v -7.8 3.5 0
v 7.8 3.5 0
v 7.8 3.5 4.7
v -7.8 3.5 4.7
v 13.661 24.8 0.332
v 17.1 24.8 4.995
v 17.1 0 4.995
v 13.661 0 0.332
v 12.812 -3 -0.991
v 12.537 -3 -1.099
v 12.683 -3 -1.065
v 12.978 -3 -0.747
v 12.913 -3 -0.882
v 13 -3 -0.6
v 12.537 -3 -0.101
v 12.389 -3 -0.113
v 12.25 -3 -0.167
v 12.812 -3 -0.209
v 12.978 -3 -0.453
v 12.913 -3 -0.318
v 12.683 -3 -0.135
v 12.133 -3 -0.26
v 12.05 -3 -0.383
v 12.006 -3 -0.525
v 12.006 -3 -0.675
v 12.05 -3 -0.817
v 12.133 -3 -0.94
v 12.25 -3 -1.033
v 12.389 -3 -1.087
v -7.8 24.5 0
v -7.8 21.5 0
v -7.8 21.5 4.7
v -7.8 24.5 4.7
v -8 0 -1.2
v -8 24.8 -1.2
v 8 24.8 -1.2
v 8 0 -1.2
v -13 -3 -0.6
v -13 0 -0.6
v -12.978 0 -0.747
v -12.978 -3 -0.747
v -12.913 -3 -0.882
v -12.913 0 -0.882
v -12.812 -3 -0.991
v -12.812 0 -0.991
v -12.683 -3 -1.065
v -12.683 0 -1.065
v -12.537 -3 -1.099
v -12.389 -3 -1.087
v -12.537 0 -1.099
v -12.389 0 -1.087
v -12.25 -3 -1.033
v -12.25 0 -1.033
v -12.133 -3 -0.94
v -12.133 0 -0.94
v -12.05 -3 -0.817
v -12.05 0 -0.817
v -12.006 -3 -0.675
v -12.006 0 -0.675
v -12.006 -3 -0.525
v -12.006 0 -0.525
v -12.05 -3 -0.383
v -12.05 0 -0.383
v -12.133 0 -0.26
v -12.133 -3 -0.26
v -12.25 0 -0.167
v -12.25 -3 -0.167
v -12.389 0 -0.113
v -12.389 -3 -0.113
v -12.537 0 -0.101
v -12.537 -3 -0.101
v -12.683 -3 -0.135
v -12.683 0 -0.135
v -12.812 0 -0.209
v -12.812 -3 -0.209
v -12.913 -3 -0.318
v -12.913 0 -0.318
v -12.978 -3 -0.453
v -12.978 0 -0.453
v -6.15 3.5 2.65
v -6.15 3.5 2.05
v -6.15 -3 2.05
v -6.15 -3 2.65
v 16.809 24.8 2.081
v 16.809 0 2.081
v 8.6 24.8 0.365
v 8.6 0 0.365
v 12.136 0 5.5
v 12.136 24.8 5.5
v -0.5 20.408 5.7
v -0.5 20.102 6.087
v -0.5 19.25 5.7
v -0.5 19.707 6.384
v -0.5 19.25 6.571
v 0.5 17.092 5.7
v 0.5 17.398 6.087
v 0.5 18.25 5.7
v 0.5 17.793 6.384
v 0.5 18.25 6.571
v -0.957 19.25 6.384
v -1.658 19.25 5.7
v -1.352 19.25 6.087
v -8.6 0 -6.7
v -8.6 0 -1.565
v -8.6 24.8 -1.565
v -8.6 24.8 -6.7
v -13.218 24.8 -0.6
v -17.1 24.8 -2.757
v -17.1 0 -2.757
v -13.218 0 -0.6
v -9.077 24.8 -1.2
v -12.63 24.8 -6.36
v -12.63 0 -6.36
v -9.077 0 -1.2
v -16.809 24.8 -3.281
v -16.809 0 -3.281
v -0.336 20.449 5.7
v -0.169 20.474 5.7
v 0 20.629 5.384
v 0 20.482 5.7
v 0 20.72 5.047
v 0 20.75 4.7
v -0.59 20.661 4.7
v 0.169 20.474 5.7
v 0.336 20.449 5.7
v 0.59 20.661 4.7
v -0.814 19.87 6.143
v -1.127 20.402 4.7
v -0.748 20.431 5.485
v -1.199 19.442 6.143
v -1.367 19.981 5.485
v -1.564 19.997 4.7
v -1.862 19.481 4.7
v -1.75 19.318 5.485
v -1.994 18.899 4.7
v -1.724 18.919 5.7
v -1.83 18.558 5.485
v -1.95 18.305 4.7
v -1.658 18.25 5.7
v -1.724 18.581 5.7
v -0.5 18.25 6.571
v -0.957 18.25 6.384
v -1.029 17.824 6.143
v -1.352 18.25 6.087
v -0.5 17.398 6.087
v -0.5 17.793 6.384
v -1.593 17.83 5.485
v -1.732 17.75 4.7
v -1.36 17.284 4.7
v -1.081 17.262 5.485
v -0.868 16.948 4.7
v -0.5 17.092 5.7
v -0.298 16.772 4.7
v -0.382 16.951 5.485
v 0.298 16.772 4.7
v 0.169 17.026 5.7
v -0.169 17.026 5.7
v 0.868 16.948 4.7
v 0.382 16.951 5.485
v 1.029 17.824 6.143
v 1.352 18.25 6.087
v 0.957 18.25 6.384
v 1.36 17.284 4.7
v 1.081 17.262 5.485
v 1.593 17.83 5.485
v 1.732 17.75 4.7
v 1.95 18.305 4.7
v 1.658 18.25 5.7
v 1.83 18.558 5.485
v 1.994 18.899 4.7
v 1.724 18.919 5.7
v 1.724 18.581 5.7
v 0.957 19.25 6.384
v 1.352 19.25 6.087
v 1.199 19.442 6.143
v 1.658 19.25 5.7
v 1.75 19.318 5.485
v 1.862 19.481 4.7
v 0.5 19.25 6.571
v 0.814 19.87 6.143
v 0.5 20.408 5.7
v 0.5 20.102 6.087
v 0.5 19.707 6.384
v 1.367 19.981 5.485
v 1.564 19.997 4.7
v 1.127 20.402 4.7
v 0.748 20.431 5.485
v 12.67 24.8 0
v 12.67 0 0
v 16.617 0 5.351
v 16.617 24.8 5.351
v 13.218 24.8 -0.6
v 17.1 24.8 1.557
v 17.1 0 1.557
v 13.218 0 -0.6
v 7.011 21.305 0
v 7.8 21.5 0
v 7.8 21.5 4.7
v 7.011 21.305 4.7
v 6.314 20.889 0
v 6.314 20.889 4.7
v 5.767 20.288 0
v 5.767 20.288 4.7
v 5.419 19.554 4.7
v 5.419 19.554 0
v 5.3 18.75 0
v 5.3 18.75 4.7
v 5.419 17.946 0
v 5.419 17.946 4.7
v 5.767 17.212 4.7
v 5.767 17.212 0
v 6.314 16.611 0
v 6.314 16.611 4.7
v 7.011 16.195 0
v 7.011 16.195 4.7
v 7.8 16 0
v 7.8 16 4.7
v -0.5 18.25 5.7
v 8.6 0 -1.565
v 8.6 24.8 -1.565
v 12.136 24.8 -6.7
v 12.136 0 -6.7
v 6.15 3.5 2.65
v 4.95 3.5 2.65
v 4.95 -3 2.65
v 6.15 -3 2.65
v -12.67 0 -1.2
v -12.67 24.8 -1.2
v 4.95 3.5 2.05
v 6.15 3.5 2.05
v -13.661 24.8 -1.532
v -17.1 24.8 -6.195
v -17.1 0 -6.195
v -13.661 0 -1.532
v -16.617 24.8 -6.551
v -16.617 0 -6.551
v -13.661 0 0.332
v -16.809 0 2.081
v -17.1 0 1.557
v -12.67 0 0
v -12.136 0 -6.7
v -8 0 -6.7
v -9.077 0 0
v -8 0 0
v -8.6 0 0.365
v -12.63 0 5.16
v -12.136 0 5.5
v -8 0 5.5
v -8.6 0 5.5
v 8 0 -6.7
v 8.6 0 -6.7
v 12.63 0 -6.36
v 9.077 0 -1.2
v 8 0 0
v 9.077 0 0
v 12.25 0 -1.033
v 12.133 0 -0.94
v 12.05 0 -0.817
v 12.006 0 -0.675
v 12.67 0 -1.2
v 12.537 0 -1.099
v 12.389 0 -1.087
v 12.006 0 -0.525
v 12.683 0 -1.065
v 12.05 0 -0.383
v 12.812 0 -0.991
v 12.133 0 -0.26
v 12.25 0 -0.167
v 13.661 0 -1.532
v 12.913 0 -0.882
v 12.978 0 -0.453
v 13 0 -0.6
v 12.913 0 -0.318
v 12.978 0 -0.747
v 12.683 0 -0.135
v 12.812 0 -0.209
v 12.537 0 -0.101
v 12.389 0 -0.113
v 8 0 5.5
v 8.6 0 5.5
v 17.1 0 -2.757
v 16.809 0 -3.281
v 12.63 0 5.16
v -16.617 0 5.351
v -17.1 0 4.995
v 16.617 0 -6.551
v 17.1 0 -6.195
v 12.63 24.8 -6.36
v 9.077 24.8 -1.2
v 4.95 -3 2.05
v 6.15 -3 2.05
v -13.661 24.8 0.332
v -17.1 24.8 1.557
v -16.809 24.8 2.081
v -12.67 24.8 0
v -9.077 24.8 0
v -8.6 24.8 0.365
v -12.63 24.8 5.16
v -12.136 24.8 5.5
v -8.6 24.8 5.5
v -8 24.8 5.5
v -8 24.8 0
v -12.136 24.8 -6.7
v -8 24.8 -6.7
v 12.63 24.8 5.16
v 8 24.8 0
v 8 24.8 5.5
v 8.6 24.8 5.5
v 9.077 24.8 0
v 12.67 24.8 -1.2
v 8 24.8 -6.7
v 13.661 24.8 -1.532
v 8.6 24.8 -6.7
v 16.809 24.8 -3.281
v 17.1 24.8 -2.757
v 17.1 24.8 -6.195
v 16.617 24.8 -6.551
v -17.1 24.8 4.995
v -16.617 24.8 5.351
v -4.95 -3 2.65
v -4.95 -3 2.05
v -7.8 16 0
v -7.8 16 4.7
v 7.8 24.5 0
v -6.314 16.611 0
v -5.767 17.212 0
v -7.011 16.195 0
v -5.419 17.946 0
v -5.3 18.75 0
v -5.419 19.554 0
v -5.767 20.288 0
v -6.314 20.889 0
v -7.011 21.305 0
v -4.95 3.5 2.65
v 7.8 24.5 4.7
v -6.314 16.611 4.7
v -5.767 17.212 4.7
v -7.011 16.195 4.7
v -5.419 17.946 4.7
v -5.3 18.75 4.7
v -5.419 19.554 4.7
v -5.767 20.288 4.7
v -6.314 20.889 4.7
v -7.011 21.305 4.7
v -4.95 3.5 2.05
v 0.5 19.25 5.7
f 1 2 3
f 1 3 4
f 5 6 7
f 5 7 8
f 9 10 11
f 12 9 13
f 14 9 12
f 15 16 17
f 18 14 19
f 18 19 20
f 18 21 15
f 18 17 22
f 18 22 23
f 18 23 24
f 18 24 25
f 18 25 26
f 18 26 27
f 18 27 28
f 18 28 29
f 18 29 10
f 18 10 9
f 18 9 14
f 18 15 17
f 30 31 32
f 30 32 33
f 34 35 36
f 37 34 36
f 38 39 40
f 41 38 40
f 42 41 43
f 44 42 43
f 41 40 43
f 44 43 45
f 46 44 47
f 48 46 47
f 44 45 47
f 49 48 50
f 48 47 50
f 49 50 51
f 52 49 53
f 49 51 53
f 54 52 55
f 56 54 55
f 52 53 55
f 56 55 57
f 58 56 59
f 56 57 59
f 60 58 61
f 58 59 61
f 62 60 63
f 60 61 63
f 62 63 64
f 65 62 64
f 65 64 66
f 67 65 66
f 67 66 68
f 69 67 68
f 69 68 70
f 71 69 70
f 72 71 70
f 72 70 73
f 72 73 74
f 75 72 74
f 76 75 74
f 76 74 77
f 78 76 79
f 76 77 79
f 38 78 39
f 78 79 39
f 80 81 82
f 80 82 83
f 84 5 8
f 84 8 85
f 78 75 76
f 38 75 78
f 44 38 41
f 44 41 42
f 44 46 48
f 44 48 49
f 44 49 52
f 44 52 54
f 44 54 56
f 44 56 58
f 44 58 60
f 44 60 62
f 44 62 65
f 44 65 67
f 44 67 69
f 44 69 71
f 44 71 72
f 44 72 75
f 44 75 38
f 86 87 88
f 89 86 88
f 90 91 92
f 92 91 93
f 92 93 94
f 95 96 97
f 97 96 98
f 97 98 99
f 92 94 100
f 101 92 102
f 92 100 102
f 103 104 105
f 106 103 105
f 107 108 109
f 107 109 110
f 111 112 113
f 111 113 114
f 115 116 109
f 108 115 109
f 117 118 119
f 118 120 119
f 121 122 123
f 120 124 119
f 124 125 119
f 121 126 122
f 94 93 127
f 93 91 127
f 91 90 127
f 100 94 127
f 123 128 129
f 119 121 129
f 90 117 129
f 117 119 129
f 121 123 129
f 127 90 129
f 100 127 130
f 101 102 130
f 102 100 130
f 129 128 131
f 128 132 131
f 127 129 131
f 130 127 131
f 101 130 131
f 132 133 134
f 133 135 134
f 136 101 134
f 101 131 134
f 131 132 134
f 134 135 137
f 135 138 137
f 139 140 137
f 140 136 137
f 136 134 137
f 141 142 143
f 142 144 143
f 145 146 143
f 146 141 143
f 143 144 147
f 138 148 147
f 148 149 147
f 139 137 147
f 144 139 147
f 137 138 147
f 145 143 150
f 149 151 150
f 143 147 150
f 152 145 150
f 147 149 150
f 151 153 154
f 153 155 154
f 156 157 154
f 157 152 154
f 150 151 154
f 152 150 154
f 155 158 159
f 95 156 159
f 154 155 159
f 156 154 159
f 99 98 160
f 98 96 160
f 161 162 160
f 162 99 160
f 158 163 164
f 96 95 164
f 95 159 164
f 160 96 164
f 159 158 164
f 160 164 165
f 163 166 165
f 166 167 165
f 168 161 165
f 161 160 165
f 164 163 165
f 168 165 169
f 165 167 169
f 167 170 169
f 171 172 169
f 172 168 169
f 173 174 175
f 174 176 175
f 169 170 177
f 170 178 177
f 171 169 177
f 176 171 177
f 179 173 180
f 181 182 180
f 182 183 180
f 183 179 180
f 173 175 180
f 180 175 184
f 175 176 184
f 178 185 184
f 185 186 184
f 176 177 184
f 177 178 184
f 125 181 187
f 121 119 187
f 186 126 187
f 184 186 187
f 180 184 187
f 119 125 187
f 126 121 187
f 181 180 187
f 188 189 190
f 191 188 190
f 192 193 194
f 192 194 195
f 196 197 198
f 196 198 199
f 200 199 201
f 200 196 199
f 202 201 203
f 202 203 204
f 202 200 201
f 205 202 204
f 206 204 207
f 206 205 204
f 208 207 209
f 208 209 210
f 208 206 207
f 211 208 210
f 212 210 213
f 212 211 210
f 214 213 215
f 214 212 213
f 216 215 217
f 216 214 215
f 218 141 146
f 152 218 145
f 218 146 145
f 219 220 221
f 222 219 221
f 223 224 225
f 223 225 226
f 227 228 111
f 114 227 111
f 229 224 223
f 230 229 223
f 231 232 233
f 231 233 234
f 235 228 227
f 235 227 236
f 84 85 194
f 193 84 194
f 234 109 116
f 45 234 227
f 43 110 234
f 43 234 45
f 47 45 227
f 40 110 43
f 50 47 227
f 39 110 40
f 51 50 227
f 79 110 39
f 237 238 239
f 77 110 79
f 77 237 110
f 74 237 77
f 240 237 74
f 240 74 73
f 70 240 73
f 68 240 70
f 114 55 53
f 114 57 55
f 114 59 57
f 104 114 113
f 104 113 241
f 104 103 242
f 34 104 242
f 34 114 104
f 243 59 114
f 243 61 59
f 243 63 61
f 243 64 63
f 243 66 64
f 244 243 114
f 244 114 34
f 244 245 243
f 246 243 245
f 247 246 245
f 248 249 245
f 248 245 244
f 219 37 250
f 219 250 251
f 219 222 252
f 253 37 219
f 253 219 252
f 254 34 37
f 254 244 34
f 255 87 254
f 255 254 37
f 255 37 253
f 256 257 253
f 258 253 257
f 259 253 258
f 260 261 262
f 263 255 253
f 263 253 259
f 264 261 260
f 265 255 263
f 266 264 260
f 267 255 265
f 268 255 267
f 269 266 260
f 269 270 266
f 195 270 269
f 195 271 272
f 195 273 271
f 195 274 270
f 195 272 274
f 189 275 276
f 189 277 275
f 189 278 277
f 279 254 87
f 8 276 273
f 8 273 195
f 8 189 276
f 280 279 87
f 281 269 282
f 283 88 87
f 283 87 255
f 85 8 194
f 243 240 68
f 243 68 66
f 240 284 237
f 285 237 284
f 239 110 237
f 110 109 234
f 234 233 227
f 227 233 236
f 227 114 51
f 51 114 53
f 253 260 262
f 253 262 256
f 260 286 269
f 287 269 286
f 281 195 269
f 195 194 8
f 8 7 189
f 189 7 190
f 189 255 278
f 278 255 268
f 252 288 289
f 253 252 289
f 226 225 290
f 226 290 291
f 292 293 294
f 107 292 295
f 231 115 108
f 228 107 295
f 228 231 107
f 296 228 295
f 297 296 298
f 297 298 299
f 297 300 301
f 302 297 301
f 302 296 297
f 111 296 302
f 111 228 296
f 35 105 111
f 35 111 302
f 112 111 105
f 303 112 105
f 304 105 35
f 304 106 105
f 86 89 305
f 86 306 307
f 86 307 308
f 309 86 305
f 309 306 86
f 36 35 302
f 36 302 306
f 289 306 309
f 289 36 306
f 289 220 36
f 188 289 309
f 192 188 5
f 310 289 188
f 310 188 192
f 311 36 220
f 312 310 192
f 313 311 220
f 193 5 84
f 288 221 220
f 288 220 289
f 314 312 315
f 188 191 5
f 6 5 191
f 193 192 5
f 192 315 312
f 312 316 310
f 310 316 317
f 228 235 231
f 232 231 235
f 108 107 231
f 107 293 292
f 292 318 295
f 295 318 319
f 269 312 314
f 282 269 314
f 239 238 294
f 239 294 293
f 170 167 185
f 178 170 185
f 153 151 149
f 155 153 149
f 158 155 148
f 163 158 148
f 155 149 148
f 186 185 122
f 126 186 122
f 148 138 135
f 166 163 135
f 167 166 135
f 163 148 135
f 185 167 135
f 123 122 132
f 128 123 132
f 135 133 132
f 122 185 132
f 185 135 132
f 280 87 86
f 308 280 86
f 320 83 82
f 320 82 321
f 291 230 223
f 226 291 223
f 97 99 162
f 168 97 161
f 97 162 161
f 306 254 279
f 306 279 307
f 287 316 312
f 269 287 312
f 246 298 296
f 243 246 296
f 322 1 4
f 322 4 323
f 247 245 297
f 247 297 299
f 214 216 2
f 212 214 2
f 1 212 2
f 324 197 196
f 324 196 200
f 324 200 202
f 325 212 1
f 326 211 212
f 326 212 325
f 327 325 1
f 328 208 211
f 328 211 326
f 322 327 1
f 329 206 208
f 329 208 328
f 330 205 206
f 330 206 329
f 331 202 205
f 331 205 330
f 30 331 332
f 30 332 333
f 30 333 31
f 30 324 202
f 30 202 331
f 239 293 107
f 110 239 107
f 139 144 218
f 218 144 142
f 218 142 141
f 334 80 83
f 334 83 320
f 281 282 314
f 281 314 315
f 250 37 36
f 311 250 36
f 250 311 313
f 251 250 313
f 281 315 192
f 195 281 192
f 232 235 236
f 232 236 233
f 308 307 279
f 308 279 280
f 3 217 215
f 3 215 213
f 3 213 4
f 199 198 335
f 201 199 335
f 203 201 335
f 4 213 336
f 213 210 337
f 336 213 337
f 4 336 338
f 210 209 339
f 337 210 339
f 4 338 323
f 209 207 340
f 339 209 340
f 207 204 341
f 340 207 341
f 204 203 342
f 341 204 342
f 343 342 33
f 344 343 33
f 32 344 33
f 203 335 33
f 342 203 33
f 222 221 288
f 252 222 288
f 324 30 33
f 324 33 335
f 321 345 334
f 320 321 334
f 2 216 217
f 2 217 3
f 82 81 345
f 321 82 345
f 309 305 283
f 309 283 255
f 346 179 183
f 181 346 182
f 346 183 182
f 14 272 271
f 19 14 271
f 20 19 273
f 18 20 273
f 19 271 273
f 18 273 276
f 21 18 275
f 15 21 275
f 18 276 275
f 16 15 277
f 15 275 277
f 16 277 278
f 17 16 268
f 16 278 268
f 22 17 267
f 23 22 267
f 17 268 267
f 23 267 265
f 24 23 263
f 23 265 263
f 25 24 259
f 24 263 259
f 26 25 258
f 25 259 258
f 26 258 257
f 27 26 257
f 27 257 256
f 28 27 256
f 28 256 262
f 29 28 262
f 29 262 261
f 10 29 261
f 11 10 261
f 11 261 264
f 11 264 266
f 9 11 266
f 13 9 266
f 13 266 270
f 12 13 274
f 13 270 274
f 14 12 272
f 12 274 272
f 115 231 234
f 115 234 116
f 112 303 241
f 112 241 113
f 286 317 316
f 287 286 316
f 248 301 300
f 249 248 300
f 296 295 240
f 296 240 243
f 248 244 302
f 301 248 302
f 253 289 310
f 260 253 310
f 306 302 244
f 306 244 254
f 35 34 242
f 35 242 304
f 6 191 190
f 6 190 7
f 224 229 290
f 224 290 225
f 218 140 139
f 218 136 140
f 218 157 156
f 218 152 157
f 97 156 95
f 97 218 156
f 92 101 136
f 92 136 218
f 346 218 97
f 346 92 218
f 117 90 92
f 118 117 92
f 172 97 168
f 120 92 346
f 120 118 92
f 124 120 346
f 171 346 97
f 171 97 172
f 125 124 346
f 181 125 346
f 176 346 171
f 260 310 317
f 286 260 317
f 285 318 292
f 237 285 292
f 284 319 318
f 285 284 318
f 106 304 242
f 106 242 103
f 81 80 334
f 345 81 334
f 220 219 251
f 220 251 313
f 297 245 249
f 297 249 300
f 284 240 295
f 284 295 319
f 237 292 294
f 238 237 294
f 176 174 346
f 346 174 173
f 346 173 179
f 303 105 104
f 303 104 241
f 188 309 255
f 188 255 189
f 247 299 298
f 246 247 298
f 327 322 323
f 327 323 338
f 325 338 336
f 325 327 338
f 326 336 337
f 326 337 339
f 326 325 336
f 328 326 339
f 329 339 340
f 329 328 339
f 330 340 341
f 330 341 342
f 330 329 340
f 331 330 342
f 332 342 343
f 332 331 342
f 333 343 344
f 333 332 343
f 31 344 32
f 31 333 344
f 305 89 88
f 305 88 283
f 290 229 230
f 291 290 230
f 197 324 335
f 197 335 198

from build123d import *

# Parameters (mm, degrees)
CROQUIS1_W                = 25.8
CROQUIS1_H                = 24.8
SALIENTE_EXTRUIR1_DEPTH   = 1.2
CROQUIS2_W                = 0.6
CROQUIS2_H                = 24.8
SALIENTE_EXTRUIR2_DEPTH   = 5.5
SALIENTE_EXTRUIR3_DEPTH   = 24.8
SIMETR_A2_COPY_1_SKETCH_W = 0.6
SIMETR_A2_COPY_1_SKETCH_H = 24.8
SIMETR_A2_COPY_1_DEPTH    = 5.5
SIMETR_A2_COPY_2_DEPTH    = 24.8
CROQUIS4_R                = 0.5
SALIENTE_EXTRUIR4_DEPTH   = 3
SALIENTE_EXTRUIR5_DEPTH   = 4.7
CROQUIS6_W                = 1.2
CROQUIS6_H                = 0.6
SALIENTE_EXTRUIR6_DEPTH   = 6.5
SALIENTE_EXTRUIR6_2_DEPTH = 6.5
CORTAR_EXTRUIR1_DEPTH     = 1


with BuildPart() as part:
    # Croquis1 → Saliente-Extruir1 (new body)
    with BuildSketch(Plane.XY):
        with Locations((0, 12.4)):
            Rectangle(CROQUIS1_W, CROQUIS1_H)
    extrude(amount=-SALIENTE_EXTRUIR1_DEPTH)

    # Croquis2 → Saliente-Extruir2 (add)
    with BuildSketch(Plane.XY):
        with Locations((8.3, 12.4)):
            Rectangle(CROQUIS2_W, CROQUIS2_H)
    saliente_extruir2 = extrude(amount=SALIENTE_EXTRUIR2_DEPTH)

    # Croquis3 → Saliente-Extruir3 (add)
    with BuildSketch(Plane(origin=(0, 24.8, 0), x_dir=(1, 0, 0), z_dir=(0, 1, 0))):
        Polygon((8.17004472, 0.25973896), (12.135766627, -5.5), (12.62995528, -5.15973896), (8.664233373, 0.6), align=None)
        Polygon((12.227201436, 0.6), (16.617165522, -5.350840205), (17.1, -4.994650836), (13.660671044, -0.332449363), (16.808614241, -2.081306694), (17.1, -1.556812329), (12.802701866, 0.830575524), (12.710035914, 0.956189369), align=None)
    saliente_extruir3 = extrude(amount=-SALIENTE_EXTRUIR3_DEPTH)

    # Simetría1: Saliente-Extruir2, Saliente-Extruir3 across plane
    add(saliente_extruir2.mirror(Plane.XY.offset(-0.6)))
    add(saliente_extruir3.mirror(Plane.XY.offset(-0.6)))

    # Simetría2: Saliente-Extruir2, Saliente-Extruir3 across plane
    add(saliente_extruir2.mirror(Plane(origin=(0, 0, 0), x_dir=(0, 0, 1), z_dir=(1, 0, 0))))
    add(saliente_extruir3.mirror(Plane(origin=(0, 0, 0), x_dir=(0, 0, 1), z_dir=(1, 0, 0))))

    # Simetría2 copy 1 sketch → Simetría2 copy 1 (add)
    with BuildSketch(Plane(origin=(0, 0, -1.2), x_dir=(-1, 0, 0), z_dir=(0, 0, -1))):
        with Locations((8.3, 12.4)):
            Rectangle(SIMETR_A2_COPY_1_SKETCH_W, SIMETR_A2_COPY_1_SKETCH_H)
    extrude(amount=SIMETR_A2_COPY_1_DEPTH)

    # Simetría2 copy 2 sketch → Simetría2 copy 2 (add)
    with BuildSketch(Plane(origin=(0, 24.8, -1.2), x_dir=(-1, 0, 0), z_dir=(0, 1, 0))):
        Polygon((8.17004472, 0.25973896), (12.135766627, -5.5), (12.62995528, -5.15973896), (8.664233373, 0.6), align=None)
        Polygon((12.227201436, 0.6), (16.617165522, -5.350840205), (17.1, -4.994650836), (13.660671044, -0.332449363), (16.808614241, -2.081306694), (17.1, -1.556812329), (12.802701866, 0.830575524), (12.710035914, 0.956189369), align=None)
    extrude(amount=-SIMETR_A2_COPY_2_DEPTH)

    # Croquis4 → Saliente-Extruir4 (add)
    with BuildSketch(Plane.XZ):
        with Locations((12.5, -0.6)):
            Circle(CROQUIS4_R)
        with Locations(Location((-12.5, -0.6, 0), (0, 0, 180))):
            Circle(CROQUIS4_R)
    extrude(amount=SALIENTE_EXTRUIR4_DEPTH)


with BuildPart() as body_2:
    # Croquis5 → Saliente-Extruir5 (new body)
    with BuildSketch(Plane.XY):
        with BuildLine():
            Line((-7.8, 24.5), (7.8, 24.5))
            Line((7.8, 24.5), (7.8, 21.5))
            ThreePointArc((7.8, 21.5), (5.3, 18.75), (7.8, 16))
            Line((7.8, 16), (7.8, 3.5))
            Line((7.8, 3.5), (-7.8, 3.5))
            Line((-7.8, 3.5), (-7.8, 16))
            ThreePointArc((-7.8, 16), (-5.3, 18.75), (-7.8, 21.5))
            Line((-7.8, 21.5), (-7.8, 24.5))
        make_face()
    extrude(amount=SALIENTE_EXTRUIR5_DEPTH)


with BuildPart() as body_3:
    # Croquis6 → Saliente-Extruir6 (new body)
    with BuildSketch(Plane.XZ.offset(-3.5)):
        with Locations((-5.55, 2.35)):
            Rectangle(CROQUIS6_W, CROQUIS6_H)
    extrude(amount=SALIENTE_EXTRUIR6_DEPTH)


with BuildPart() as body_4:
    # Croquis6 → Saliente-Extruir6 2 (new body)
    with BuildSketch(Plane.XZ.offset(-3.5)):
        with Locations((5.55, 2.35)):
            Rectangle(CROQUIS6_W, CROQUIS6_H)
    extrude(amount=SALIENTE_EXTRUIR6_2_DEPTH)


with BuildPart() as body_5:
    # Croquis7 → Revolución1 (revolve)
    with BuildSketch(Plane(origin=(0, 0, 0), x_dir=(0, 0, -1), z_dir=(1, 0, 0))):
        with BuildLine():
            Line((-4.7, 18.75), (-6.7, 18.75))
            ThreePointArc((-6.7, 18.75), (-6.114213562, 20.164213562), (-4.7, 20.75))
            Line((-4.7, 20.75), (-4.7, 18.75))
        make_face()
    revolve(axis=Axis((0, 18.75, 4.7), (0, 0, 1)))

    # Croquis8 → Cortar-Extruir1 (cut)
    with BuildSketch(Plane.XY.offset(6.7)):
        Polygon((0.5, 18.25), (1.936491673, 18.25), (1.936491673, 19.25), (0.5, 19.25), (0.5, 20.686491673), (-0.5, 20.686491673), (-0.5, 19.25), (-1.936491673, 19.25), (-1.936491673, 18.25), (-0.5, 18.25), (-0.5, 16.813508327), (0.5, 16.813508327), align=None)
    extrude(amount=-CORTAR_EXTRUIR1_DEPTH, mode=Mode.SUBTRACT)


solid = Compound([part.part, body_2.part, body_3.part, body_4.part, body_5.part])
